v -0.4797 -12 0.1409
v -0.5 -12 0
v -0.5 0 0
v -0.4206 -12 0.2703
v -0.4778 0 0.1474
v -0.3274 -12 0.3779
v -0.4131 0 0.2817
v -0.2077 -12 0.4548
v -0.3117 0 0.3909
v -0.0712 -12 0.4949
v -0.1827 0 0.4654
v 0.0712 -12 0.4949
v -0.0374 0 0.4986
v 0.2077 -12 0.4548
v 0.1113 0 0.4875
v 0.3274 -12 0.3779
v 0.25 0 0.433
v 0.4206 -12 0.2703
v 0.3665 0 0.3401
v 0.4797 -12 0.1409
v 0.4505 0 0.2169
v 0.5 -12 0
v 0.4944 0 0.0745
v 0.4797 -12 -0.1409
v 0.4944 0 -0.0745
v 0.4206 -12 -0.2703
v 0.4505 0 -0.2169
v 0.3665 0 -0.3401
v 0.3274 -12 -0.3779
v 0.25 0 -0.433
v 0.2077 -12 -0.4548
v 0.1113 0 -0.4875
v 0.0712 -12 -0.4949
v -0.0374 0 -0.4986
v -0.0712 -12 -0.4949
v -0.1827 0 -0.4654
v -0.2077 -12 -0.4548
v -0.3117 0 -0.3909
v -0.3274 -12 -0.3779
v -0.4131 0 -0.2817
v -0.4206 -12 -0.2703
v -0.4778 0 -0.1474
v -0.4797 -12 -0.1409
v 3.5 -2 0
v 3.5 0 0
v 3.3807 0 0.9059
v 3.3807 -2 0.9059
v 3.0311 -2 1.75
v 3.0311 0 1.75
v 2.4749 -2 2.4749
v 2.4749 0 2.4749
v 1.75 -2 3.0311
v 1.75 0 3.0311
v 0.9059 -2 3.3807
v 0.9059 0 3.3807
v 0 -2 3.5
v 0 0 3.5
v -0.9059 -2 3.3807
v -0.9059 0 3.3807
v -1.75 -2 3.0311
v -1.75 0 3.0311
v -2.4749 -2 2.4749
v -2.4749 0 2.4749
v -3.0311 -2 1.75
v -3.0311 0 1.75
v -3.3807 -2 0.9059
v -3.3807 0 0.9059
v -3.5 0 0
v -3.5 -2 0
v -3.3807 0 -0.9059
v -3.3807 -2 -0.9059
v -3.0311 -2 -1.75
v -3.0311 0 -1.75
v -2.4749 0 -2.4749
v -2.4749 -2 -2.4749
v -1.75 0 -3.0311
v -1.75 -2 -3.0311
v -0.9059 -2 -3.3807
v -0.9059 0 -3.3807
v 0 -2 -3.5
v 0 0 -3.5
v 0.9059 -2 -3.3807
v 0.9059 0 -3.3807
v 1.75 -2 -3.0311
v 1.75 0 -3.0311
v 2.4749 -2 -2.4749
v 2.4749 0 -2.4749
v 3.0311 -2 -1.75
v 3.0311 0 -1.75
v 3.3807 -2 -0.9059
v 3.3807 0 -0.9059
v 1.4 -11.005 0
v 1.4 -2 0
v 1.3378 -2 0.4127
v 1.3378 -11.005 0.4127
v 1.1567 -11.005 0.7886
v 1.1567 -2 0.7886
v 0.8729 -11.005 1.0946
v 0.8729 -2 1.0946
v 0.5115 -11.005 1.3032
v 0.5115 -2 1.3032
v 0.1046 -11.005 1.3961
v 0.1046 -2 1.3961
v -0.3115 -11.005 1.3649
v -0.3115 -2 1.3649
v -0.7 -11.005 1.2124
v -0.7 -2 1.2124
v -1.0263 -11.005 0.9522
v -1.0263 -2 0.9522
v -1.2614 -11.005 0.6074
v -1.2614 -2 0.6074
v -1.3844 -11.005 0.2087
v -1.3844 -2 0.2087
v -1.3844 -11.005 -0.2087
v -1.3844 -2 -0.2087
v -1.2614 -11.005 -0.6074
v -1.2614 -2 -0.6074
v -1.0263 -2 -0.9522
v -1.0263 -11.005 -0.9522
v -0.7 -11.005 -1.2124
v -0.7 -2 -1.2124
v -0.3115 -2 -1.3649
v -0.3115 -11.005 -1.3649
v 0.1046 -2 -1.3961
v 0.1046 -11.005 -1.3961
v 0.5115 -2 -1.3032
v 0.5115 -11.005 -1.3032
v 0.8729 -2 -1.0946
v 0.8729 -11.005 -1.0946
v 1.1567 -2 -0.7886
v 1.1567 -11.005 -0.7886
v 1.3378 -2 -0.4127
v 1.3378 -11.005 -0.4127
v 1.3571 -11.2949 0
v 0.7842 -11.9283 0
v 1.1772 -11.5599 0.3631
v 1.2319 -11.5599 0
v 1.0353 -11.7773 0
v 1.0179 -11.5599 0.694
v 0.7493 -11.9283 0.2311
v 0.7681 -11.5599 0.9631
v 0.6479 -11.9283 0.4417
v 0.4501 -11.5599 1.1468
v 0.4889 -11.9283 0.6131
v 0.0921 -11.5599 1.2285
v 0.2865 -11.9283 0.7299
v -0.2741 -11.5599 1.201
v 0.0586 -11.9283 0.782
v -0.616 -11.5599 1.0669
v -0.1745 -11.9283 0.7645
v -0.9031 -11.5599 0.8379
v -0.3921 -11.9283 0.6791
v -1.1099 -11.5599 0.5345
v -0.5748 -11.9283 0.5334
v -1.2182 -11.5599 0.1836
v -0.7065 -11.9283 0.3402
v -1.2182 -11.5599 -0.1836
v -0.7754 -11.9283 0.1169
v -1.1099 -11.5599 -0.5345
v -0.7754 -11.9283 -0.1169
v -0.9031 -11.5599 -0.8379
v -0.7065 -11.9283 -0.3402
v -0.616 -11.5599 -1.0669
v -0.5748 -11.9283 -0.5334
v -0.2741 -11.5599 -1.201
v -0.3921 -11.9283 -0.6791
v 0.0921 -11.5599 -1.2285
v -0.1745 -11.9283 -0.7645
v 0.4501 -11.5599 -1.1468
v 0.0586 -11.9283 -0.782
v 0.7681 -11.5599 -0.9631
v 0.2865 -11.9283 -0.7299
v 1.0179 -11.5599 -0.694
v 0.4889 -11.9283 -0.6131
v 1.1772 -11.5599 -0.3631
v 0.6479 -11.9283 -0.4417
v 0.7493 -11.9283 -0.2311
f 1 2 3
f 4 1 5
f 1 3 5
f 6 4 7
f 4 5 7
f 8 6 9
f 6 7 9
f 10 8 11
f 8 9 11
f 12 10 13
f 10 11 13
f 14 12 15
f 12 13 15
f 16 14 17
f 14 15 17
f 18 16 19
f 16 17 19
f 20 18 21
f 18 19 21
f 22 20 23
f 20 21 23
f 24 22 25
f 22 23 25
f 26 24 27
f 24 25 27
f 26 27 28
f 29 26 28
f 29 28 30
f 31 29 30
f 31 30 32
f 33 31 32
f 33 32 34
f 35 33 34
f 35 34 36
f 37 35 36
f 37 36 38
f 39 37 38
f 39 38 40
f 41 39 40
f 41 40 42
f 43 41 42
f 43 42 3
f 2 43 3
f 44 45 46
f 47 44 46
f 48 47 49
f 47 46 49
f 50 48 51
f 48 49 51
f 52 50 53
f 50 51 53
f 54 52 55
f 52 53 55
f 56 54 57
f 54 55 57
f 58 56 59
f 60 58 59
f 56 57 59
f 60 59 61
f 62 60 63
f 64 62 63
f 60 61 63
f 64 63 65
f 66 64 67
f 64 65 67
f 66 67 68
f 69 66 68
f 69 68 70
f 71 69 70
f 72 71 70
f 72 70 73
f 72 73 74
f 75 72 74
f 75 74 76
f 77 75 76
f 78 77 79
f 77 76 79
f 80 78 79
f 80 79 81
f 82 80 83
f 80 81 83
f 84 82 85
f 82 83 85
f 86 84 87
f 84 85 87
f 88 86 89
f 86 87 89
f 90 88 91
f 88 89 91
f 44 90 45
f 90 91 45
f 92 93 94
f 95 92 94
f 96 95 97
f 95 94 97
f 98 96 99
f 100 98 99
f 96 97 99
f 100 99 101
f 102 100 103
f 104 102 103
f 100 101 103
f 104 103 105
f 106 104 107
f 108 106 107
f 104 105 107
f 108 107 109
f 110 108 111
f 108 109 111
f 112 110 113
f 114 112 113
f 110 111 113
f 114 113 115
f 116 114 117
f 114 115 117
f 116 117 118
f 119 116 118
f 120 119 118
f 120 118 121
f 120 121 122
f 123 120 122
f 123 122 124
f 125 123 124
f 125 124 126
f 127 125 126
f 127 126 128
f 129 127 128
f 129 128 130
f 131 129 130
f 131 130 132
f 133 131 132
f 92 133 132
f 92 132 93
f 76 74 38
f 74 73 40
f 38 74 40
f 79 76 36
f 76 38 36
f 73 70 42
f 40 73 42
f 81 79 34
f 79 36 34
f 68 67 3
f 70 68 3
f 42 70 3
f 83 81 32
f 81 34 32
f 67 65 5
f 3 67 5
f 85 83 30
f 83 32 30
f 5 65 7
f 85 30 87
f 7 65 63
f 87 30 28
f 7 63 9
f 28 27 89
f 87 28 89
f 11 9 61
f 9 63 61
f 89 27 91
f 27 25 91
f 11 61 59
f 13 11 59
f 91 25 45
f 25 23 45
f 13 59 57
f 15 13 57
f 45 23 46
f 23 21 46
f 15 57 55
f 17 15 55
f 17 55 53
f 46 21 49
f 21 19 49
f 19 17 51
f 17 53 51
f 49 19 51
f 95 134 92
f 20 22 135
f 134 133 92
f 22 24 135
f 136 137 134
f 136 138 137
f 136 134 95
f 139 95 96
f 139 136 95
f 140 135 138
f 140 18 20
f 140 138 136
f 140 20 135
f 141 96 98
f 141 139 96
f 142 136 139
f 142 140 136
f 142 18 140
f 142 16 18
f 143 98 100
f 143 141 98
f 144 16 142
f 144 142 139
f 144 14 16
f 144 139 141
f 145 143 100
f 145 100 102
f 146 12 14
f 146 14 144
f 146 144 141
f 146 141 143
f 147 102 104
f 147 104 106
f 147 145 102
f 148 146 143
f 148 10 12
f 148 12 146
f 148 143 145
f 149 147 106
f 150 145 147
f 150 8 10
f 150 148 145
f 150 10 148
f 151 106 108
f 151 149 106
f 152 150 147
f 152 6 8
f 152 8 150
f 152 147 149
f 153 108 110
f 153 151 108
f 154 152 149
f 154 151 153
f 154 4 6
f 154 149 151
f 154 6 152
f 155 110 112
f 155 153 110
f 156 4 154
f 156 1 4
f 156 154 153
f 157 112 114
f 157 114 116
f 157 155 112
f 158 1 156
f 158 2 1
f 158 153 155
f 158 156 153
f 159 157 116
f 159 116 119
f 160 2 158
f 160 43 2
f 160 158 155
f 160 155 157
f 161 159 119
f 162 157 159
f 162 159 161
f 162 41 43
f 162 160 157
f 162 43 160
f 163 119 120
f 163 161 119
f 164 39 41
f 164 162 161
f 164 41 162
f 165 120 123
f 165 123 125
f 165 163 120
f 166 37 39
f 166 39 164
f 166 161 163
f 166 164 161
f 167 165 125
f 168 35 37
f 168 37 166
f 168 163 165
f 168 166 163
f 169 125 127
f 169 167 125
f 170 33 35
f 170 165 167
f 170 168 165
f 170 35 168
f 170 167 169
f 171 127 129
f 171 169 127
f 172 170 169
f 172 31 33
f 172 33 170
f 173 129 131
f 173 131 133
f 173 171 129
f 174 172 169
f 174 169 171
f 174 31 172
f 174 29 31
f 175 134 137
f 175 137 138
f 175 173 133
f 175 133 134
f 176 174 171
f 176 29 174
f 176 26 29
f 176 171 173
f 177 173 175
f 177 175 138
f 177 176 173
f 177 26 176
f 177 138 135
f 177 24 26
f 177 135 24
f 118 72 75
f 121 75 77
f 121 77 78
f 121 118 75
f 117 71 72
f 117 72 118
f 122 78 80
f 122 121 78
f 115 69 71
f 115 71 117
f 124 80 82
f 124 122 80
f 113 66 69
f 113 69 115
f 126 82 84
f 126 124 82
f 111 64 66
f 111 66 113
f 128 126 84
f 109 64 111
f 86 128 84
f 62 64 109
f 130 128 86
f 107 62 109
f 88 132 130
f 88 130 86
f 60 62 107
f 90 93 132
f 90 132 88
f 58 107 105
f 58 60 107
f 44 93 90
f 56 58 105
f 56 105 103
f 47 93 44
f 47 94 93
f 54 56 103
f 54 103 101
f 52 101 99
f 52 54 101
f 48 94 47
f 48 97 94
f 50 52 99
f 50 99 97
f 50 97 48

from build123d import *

# Parameters (mm, degrees)
F0_R     = 3.5
F1_DEPTH = 2
F2_R     = 1.4
F3_DEPTH = 10
F4_R     = 0.5
F5_DEPTH = 12.001


# Not quite as in the source:
# - a fillet or chamfer that OpenCascade refuses, or shapes differently, is made with other operations: its cross-section is extruded or revolved along the edge and cut away or added


with BuildPart() as f1:
    # F0 (on Front) → F1 (new body)
    with BuildSketch(Plane.XZ):
        Circle(F0_R)
    extrude(amount=F1_DEPTH)

    # F2 (on face) → F3 (join)
    with BuildSketch(Plane.XZ.offset(2)):
        Circle(F2_R)
    extrude(amount=F3_DEPTH)

    # F4 (on face) → F5 (cut, through all)
    with BuildSketch(Plane(origin=(0, 0, 0), x_dir=(-1, 0, 0), z_dir=(0, 1, 0))):
        Circle(F4_R)
    extrude(amount=-F5_DEPTH, mode=Mode.SUBTRACT)

    # F6: fillet of radius 1 on 1 edges, made by hand

    # F6_s1 → F6_t2 (revolve, cut)
    with BuildSketch(Plane.XY):
        with BuildLine():
            ThreePointArc((1.4, -11.0050125629), (1.1416198487, -11.6758329561), (0.5, -12))
            Line((0.5, -12), (1.4, -12))
            Line((1.4, -12), (1.4, -11.0050125629))
        make_face()
    revolve(axis=Axis((0, -12, 0), (0, -1, 0)), mode=Mode.SUBTRACT)


solid = f1.part
